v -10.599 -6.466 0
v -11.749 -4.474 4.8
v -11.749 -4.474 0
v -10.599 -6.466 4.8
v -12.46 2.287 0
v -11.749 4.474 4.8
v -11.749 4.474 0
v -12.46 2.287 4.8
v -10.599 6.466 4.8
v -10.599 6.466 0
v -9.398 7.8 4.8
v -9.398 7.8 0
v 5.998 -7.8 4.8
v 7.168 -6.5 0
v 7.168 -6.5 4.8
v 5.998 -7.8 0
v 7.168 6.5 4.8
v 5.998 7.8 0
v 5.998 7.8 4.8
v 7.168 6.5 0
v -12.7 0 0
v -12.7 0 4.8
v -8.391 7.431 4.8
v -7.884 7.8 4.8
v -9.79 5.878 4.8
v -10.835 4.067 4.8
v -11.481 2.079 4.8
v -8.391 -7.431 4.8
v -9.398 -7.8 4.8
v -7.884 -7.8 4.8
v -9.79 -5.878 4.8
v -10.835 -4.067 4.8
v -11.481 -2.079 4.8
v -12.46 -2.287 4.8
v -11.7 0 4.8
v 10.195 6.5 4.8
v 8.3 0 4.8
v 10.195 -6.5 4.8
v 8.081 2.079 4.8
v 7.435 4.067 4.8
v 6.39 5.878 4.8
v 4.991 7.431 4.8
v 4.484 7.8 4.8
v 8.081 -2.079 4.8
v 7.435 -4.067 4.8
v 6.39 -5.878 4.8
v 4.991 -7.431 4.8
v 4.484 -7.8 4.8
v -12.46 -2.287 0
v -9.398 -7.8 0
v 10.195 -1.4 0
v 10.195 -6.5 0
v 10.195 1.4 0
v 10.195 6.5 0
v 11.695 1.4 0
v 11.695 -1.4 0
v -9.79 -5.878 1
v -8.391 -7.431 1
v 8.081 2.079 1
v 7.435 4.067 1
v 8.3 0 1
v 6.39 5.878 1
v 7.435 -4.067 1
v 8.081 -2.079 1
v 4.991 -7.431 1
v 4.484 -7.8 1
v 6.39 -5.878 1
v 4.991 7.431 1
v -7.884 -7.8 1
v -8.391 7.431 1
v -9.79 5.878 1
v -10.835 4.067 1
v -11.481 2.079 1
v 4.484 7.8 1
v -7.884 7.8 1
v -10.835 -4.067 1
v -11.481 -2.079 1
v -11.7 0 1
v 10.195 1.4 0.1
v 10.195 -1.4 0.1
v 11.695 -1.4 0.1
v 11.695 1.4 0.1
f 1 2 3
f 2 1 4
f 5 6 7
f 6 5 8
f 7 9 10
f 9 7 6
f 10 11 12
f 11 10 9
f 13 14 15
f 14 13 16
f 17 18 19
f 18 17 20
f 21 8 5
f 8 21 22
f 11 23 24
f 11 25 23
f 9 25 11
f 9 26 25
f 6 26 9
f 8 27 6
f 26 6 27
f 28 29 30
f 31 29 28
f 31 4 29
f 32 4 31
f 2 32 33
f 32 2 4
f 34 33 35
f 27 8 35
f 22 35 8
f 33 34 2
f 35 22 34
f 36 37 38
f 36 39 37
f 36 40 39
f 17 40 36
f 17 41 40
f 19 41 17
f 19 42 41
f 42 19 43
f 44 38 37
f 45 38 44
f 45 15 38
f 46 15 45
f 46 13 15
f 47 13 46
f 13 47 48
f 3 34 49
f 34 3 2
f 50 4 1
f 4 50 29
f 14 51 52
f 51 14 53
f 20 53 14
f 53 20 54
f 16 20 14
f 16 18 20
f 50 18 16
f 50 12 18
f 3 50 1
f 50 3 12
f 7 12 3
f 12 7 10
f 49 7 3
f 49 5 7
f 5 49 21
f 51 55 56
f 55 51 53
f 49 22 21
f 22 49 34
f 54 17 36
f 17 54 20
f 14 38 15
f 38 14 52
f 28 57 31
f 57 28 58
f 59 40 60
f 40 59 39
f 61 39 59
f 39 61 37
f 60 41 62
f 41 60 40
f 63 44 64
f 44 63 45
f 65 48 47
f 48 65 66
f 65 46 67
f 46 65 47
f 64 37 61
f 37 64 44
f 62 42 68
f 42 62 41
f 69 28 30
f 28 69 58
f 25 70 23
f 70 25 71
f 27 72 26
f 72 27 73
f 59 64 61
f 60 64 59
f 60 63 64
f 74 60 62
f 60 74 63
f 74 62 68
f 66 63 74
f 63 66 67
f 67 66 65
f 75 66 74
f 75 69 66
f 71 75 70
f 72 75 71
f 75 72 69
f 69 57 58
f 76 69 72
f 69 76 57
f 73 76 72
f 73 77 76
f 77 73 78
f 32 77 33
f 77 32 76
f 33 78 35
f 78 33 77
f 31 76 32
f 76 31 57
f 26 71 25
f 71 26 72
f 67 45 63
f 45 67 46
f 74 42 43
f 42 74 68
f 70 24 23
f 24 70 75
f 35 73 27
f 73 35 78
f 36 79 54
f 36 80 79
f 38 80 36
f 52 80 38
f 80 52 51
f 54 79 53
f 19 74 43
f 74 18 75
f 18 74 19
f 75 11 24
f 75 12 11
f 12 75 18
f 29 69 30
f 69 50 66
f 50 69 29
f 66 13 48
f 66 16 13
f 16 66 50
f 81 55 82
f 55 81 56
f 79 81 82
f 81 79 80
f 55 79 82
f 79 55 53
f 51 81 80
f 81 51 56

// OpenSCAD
translate([-1.7, 0, 0])
union() {
    color("Black") intersection(){
        translate([-11.895, -7.8]) cube([23.79, 15.6, 4.8]);
        difference() {
            union() {           
                cylinder(h=4.8, d=22);
                translate([8, -6.5, 0]) cube([4.79, 13, 4.8]);
            }
                translate([0, 0, 1]) cylinder(h=3.8, d=20);    
        }
    }
    color("Gold") {
        translate([-10.5, -0.9, 0]) cube([4, 1.8, 0.1]);
     translate([22.79/2, -1.4, 0]) cube([2, 2.8, 0.1]);   
    }
}
